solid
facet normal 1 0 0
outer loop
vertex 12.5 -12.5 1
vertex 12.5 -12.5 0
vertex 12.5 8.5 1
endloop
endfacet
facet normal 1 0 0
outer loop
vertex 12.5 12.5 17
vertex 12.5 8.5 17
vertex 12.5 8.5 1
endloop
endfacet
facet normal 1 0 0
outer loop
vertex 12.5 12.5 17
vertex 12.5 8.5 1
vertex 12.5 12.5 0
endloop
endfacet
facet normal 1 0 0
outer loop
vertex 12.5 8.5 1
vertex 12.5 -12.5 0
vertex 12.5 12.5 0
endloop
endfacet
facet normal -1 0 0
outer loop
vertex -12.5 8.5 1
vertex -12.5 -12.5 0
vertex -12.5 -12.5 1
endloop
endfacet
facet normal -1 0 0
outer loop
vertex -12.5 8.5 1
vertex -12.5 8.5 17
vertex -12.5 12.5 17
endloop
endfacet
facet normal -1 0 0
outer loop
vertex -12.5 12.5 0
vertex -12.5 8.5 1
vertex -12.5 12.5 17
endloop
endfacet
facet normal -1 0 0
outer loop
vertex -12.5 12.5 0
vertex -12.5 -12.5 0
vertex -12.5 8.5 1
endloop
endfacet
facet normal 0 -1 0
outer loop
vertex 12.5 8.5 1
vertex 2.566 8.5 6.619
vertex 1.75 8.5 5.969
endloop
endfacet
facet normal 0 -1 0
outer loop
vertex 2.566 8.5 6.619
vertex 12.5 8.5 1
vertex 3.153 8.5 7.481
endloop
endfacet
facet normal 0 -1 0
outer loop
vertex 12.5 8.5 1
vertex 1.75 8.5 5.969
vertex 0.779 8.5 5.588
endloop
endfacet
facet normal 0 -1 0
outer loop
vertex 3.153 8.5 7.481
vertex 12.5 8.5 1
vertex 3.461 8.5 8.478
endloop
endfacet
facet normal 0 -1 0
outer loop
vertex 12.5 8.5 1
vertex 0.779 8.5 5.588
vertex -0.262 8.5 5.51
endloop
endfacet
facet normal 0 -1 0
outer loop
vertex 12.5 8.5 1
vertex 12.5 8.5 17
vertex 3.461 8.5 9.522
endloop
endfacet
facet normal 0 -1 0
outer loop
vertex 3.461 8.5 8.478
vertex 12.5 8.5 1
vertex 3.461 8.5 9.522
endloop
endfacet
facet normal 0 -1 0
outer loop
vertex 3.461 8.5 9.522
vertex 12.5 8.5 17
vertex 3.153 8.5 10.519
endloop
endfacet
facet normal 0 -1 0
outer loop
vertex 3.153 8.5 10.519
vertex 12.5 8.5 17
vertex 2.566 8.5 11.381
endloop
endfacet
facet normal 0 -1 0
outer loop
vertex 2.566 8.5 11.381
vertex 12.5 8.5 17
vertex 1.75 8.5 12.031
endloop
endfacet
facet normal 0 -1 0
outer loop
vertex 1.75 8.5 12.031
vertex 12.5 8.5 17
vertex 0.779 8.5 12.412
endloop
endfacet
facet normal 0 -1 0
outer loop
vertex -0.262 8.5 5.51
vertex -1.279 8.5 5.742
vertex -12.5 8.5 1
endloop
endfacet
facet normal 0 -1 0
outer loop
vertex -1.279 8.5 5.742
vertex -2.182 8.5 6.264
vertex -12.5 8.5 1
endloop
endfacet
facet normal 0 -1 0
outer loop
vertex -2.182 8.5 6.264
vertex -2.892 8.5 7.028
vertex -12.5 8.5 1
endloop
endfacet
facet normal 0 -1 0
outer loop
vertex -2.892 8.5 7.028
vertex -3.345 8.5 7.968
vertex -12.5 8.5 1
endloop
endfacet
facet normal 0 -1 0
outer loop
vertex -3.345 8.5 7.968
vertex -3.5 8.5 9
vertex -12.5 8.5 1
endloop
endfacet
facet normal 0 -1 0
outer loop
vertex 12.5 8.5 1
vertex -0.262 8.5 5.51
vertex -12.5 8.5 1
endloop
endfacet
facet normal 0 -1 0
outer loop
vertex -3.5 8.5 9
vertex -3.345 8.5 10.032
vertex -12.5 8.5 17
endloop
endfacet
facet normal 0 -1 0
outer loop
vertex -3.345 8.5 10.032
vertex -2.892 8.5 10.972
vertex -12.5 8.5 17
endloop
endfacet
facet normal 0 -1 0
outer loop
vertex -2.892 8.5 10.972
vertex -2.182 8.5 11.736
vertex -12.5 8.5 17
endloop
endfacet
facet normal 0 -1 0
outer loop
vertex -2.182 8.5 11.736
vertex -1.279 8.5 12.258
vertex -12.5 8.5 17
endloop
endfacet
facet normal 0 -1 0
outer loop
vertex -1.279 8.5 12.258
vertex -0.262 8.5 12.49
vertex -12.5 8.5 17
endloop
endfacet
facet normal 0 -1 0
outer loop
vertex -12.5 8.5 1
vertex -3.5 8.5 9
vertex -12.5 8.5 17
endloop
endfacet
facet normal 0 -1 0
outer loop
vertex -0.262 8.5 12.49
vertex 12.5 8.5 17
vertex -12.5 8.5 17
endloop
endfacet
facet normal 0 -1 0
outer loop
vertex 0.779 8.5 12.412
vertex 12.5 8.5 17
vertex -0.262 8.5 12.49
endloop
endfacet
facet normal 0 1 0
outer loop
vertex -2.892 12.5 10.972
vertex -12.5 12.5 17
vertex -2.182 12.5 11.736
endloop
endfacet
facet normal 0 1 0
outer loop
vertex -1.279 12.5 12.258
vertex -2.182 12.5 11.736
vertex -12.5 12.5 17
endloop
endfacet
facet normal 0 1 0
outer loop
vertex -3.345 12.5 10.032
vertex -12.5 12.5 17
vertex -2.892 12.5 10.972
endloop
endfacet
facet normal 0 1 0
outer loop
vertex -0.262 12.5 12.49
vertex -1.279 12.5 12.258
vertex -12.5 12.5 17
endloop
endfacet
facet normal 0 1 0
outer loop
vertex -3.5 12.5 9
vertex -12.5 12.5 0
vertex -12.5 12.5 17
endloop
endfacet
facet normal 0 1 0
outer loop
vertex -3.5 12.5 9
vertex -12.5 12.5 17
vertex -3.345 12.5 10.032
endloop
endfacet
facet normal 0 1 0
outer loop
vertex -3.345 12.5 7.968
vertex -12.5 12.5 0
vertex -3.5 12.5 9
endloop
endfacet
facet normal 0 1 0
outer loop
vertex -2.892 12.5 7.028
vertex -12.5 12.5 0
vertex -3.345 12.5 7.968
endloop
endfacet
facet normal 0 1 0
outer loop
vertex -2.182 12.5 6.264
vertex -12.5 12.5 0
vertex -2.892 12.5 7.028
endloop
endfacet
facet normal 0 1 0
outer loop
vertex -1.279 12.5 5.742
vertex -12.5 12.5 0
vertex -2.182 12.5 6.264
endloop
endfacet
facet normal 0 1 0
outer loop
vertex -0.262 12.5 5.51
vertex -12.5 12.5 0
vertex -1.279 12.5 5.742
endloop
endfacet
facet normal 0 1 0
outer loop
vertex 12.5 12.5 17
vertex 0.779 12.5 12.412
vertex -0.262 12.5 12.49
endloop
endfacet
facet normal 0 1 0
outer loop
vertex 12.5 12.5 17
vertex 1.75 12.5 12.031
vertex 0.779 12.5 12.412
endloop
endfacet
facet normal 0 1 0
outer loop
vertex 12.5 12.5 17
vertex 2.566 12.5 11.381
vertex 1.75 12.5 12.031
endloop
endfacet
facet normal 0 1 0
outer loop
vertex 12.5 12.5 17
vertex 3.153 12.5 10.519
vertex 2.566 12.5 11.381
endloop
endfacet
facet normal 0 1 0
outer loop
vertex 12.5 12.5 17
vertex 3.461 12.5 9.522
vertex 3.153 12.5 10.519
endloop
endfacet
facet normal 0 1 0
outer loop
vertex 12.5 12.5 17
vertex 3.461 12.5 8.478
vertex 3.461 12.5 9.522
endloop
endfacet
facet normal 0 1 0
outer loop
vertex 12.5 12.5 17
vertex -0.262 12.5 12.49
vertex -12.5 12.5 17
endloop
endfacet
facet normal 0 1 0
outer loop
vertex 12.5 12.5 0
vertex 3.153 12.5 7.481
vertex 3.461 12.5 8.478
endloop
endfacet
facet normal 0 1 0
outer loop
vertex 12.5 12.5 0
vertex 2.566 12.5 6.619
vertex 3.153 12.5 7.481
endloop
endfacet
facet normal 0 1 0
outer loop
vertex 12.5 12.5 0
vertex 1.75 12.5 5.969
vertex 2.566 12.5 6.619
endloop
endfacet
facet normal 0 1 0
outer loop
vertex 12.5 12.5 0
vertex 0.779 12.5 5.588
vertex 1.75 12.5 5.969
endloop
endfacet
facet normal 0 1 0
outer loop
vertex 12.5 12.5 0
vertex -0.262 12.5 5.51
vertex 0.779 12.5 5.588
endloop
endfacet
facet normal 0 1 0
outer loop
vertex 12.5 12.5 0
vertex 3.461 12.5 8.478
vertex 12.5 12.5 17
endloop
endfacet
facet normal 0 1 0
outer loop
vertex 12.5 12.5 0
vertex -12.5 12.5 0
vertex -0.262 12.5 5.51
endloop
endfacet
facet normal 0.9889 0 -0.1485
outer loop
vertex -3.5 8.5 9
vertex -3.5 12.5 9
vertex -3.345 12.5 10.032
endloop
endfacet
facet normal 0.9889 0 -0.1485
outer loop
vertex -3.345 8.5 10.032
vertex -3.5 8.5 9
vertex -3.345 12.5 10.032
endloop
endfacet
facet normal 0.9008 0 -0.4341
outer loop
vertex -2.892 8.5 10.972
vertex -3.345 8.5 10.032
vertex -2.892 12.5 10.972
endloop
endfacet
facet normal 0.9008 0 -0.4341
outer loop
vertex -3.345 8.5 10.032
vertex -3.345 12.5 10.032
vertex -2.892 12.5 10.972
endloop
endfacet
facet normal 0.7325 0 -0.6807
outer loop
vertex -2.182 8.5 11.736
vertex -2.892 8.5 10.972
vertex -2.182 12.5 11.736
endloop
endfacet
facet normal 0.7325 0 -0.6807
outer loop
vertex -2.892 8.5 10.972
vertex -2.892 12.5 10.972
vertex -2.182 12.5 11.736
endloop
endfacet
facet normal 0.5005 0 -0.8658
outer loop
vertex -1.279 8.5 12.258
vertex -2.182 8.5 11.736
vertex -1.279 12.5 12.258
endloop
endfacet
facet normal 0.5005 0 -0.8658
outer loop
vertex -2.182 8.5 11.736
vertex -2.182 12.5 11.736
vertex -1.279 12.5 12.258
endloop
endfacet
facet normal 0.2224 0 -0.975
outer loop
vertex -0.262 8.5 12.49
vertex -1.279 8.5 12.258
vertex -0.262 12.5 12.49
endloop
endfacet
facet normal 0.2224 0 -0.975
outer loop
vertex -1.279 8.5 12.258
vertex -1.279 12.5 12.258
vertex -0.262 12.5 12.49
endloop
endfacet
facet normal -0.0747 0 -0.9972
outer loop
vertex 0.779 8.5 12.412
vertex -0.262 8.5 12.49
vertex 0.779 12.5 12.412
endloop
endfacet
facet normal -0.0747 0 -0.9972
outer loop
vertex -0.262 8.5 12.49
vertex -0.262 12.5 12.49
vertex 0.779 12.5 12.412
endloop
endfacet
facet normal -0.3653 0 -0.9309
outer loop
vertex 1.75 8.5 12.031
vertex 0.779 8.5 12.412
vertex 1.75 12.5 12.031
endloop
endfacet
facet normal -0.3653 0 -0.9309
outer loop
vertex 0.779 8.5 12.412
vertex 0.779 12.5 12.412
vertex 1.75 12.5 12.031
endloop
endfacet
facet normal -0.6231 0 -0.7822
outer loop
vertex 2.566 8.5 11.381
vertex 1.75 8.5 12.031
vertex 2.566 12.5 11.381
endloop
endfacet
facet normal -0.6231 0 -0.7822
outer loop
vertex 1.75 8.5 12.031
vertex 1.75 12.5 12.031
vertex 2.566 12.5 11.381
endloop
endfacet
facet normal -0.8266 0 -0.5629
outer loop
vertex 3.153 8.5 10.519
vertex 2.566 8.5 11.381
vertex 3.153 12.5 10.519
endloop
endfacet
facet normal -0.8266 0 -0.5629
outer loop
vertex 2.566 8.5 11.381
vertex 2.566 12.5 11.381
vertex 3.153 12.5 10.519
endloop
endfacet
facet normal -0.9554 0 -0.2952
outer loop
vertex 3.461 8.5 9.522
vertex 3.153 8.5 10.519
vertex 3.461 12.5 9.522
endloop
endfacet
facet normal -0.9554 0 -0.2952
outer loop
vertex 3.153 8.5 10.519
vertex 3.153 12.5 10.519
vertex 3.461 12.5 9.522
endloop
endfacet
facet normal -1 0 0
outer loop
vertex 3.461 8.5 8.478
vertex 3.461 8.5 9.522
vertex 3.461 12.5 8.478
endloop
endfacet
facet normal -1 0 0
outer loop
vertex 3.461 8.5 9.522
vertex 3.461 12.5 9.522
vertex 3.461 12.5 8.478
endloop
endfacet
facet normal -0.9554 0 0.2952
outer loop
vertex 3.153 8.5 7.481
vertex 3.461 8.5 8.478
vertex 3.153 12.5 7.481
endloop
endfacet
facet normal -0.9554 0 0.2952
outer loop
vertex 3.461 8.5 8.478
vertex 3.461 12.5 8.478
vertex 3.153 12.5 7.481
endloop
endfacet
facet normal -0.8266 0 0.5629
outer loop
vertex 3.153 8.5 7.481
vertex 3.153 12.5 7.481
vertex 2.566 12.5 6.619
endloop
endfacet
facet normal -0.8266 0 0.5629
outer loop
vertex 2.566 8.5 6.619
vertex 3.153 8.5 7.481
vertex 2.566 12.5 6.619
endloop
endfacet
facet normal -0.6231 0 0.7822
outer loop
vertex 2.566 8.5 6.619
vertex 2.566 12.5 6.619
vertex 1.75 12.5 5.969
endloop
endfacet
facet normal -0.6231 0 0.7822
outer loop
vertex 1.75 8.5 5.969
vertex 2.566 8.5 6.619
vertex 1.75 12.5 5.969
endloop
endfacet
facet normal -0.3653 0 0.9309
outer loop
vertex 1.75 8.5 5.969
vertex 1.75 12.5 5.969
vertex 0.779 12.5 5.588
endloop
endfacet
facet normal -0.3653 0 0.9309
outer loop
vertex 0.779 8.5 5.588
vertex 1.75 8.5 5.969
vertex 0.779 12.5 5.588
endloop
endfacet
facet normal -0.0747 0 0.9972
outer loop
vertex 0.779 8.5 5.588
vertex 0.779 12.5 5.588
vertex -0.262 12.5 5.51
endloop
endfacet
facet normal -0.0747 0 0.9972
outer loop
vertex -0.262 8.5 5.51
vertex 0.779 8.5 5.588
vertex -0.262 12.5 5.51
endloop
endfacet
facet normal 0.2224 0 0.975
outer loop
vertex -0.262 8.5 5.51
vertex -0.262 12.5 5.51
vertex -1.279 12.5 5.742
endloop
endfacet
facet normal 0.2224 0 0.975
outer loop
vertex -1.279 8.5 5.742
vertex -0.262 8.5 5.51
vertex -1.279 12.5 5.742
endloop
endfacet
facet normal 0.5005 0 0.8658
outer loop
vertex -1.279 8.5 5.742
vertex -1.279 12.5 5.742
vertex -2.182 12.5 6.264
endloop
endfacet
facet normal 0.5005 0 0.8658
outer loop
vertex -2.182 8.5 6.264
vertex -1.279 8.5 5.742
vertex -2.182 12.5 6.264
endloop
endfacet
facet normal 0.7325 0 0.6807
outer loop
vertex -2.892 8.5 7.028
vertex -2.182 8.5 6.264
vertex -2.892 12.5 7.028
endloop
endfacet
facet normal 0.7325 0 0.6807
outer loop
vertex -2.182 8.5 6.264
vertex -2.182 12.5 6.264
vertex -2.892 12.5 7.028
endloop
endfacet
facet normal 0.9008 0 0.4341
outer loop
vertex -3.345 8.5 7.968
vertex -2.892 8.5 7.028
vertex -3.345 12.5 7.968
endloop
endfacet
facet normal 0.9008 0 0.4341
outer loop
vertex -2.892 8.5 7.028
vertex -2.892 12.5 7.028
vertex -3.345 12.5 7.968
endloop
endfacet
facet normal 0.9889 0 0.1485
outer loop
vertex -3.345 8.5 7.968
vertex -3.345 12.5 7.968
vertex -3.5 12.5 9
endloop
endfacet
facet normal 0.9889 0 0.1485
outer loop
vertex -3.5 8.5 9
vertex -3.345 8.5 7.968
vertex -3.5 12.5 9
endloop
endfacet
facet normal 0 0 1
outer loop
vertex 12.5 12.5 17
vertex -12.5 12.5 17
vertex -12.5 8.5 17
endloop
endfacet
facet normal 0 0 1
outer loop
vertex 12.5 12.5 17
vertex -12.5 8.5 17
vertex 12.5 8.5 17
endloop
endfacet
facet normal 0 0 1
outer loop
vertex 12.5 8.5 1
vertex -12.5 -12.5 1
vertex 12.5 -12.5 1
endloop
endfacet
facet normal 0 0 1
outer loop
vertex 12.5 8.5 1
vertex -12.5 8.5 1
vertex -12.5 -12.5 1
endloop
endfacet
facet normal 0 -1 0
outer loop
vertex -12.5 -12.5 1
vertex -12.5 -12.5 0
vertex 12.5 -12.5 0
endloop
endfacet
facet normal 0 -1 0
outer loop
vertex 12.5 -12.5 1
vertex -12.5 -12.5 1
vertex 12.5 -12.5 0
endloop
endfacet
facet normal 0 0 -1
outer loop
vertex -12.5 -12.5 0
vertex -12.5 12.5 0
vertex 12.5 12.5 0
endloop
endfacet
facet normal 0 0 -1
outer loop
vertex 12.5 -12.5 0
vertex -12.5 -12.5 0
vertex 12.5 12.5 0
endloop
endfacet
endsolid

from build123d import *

# Parameters (mm, degrees)
F0_W     = 25
F0_H     = 25
F1_DEPTH = 17
F3_DEPTH = 16
F4_R     = 3.5
F5_DEPTH = 4


with BuildPart() as f1:
    # F0 (on Top) → F1 (new body)
    with BuildSketch(Plane.XY):
        Rectangle(F0_W, F0_H)
    extrude(amount=F1_DEPTH)

    # F2 (on face) → F3 (cut)
    with BuildSketch(Plane.XY.offset(17)):
        Polygon((-12.5, -12.5), (0, -12.5), (12.5, -12.5), (12.5, 8.5), (-12.5, 8.5), align=None)
    extrude(amount=-F3_DEPTH, mode=Mode.SUBTRACT)

    # F4 (on face) → F5 (cut, through all)
    with BuildSketch(Plane(origin=(0, 12.5, 0), x_dir=(-1, 0, 0), z_dir=(0, 1, 0))):
        with Locations((0, 9)):
            Circle(F4_R)
    extrude(amount=-F5_DEPTH, mode=Mode.SUBTRACT)


solid = f1.part
